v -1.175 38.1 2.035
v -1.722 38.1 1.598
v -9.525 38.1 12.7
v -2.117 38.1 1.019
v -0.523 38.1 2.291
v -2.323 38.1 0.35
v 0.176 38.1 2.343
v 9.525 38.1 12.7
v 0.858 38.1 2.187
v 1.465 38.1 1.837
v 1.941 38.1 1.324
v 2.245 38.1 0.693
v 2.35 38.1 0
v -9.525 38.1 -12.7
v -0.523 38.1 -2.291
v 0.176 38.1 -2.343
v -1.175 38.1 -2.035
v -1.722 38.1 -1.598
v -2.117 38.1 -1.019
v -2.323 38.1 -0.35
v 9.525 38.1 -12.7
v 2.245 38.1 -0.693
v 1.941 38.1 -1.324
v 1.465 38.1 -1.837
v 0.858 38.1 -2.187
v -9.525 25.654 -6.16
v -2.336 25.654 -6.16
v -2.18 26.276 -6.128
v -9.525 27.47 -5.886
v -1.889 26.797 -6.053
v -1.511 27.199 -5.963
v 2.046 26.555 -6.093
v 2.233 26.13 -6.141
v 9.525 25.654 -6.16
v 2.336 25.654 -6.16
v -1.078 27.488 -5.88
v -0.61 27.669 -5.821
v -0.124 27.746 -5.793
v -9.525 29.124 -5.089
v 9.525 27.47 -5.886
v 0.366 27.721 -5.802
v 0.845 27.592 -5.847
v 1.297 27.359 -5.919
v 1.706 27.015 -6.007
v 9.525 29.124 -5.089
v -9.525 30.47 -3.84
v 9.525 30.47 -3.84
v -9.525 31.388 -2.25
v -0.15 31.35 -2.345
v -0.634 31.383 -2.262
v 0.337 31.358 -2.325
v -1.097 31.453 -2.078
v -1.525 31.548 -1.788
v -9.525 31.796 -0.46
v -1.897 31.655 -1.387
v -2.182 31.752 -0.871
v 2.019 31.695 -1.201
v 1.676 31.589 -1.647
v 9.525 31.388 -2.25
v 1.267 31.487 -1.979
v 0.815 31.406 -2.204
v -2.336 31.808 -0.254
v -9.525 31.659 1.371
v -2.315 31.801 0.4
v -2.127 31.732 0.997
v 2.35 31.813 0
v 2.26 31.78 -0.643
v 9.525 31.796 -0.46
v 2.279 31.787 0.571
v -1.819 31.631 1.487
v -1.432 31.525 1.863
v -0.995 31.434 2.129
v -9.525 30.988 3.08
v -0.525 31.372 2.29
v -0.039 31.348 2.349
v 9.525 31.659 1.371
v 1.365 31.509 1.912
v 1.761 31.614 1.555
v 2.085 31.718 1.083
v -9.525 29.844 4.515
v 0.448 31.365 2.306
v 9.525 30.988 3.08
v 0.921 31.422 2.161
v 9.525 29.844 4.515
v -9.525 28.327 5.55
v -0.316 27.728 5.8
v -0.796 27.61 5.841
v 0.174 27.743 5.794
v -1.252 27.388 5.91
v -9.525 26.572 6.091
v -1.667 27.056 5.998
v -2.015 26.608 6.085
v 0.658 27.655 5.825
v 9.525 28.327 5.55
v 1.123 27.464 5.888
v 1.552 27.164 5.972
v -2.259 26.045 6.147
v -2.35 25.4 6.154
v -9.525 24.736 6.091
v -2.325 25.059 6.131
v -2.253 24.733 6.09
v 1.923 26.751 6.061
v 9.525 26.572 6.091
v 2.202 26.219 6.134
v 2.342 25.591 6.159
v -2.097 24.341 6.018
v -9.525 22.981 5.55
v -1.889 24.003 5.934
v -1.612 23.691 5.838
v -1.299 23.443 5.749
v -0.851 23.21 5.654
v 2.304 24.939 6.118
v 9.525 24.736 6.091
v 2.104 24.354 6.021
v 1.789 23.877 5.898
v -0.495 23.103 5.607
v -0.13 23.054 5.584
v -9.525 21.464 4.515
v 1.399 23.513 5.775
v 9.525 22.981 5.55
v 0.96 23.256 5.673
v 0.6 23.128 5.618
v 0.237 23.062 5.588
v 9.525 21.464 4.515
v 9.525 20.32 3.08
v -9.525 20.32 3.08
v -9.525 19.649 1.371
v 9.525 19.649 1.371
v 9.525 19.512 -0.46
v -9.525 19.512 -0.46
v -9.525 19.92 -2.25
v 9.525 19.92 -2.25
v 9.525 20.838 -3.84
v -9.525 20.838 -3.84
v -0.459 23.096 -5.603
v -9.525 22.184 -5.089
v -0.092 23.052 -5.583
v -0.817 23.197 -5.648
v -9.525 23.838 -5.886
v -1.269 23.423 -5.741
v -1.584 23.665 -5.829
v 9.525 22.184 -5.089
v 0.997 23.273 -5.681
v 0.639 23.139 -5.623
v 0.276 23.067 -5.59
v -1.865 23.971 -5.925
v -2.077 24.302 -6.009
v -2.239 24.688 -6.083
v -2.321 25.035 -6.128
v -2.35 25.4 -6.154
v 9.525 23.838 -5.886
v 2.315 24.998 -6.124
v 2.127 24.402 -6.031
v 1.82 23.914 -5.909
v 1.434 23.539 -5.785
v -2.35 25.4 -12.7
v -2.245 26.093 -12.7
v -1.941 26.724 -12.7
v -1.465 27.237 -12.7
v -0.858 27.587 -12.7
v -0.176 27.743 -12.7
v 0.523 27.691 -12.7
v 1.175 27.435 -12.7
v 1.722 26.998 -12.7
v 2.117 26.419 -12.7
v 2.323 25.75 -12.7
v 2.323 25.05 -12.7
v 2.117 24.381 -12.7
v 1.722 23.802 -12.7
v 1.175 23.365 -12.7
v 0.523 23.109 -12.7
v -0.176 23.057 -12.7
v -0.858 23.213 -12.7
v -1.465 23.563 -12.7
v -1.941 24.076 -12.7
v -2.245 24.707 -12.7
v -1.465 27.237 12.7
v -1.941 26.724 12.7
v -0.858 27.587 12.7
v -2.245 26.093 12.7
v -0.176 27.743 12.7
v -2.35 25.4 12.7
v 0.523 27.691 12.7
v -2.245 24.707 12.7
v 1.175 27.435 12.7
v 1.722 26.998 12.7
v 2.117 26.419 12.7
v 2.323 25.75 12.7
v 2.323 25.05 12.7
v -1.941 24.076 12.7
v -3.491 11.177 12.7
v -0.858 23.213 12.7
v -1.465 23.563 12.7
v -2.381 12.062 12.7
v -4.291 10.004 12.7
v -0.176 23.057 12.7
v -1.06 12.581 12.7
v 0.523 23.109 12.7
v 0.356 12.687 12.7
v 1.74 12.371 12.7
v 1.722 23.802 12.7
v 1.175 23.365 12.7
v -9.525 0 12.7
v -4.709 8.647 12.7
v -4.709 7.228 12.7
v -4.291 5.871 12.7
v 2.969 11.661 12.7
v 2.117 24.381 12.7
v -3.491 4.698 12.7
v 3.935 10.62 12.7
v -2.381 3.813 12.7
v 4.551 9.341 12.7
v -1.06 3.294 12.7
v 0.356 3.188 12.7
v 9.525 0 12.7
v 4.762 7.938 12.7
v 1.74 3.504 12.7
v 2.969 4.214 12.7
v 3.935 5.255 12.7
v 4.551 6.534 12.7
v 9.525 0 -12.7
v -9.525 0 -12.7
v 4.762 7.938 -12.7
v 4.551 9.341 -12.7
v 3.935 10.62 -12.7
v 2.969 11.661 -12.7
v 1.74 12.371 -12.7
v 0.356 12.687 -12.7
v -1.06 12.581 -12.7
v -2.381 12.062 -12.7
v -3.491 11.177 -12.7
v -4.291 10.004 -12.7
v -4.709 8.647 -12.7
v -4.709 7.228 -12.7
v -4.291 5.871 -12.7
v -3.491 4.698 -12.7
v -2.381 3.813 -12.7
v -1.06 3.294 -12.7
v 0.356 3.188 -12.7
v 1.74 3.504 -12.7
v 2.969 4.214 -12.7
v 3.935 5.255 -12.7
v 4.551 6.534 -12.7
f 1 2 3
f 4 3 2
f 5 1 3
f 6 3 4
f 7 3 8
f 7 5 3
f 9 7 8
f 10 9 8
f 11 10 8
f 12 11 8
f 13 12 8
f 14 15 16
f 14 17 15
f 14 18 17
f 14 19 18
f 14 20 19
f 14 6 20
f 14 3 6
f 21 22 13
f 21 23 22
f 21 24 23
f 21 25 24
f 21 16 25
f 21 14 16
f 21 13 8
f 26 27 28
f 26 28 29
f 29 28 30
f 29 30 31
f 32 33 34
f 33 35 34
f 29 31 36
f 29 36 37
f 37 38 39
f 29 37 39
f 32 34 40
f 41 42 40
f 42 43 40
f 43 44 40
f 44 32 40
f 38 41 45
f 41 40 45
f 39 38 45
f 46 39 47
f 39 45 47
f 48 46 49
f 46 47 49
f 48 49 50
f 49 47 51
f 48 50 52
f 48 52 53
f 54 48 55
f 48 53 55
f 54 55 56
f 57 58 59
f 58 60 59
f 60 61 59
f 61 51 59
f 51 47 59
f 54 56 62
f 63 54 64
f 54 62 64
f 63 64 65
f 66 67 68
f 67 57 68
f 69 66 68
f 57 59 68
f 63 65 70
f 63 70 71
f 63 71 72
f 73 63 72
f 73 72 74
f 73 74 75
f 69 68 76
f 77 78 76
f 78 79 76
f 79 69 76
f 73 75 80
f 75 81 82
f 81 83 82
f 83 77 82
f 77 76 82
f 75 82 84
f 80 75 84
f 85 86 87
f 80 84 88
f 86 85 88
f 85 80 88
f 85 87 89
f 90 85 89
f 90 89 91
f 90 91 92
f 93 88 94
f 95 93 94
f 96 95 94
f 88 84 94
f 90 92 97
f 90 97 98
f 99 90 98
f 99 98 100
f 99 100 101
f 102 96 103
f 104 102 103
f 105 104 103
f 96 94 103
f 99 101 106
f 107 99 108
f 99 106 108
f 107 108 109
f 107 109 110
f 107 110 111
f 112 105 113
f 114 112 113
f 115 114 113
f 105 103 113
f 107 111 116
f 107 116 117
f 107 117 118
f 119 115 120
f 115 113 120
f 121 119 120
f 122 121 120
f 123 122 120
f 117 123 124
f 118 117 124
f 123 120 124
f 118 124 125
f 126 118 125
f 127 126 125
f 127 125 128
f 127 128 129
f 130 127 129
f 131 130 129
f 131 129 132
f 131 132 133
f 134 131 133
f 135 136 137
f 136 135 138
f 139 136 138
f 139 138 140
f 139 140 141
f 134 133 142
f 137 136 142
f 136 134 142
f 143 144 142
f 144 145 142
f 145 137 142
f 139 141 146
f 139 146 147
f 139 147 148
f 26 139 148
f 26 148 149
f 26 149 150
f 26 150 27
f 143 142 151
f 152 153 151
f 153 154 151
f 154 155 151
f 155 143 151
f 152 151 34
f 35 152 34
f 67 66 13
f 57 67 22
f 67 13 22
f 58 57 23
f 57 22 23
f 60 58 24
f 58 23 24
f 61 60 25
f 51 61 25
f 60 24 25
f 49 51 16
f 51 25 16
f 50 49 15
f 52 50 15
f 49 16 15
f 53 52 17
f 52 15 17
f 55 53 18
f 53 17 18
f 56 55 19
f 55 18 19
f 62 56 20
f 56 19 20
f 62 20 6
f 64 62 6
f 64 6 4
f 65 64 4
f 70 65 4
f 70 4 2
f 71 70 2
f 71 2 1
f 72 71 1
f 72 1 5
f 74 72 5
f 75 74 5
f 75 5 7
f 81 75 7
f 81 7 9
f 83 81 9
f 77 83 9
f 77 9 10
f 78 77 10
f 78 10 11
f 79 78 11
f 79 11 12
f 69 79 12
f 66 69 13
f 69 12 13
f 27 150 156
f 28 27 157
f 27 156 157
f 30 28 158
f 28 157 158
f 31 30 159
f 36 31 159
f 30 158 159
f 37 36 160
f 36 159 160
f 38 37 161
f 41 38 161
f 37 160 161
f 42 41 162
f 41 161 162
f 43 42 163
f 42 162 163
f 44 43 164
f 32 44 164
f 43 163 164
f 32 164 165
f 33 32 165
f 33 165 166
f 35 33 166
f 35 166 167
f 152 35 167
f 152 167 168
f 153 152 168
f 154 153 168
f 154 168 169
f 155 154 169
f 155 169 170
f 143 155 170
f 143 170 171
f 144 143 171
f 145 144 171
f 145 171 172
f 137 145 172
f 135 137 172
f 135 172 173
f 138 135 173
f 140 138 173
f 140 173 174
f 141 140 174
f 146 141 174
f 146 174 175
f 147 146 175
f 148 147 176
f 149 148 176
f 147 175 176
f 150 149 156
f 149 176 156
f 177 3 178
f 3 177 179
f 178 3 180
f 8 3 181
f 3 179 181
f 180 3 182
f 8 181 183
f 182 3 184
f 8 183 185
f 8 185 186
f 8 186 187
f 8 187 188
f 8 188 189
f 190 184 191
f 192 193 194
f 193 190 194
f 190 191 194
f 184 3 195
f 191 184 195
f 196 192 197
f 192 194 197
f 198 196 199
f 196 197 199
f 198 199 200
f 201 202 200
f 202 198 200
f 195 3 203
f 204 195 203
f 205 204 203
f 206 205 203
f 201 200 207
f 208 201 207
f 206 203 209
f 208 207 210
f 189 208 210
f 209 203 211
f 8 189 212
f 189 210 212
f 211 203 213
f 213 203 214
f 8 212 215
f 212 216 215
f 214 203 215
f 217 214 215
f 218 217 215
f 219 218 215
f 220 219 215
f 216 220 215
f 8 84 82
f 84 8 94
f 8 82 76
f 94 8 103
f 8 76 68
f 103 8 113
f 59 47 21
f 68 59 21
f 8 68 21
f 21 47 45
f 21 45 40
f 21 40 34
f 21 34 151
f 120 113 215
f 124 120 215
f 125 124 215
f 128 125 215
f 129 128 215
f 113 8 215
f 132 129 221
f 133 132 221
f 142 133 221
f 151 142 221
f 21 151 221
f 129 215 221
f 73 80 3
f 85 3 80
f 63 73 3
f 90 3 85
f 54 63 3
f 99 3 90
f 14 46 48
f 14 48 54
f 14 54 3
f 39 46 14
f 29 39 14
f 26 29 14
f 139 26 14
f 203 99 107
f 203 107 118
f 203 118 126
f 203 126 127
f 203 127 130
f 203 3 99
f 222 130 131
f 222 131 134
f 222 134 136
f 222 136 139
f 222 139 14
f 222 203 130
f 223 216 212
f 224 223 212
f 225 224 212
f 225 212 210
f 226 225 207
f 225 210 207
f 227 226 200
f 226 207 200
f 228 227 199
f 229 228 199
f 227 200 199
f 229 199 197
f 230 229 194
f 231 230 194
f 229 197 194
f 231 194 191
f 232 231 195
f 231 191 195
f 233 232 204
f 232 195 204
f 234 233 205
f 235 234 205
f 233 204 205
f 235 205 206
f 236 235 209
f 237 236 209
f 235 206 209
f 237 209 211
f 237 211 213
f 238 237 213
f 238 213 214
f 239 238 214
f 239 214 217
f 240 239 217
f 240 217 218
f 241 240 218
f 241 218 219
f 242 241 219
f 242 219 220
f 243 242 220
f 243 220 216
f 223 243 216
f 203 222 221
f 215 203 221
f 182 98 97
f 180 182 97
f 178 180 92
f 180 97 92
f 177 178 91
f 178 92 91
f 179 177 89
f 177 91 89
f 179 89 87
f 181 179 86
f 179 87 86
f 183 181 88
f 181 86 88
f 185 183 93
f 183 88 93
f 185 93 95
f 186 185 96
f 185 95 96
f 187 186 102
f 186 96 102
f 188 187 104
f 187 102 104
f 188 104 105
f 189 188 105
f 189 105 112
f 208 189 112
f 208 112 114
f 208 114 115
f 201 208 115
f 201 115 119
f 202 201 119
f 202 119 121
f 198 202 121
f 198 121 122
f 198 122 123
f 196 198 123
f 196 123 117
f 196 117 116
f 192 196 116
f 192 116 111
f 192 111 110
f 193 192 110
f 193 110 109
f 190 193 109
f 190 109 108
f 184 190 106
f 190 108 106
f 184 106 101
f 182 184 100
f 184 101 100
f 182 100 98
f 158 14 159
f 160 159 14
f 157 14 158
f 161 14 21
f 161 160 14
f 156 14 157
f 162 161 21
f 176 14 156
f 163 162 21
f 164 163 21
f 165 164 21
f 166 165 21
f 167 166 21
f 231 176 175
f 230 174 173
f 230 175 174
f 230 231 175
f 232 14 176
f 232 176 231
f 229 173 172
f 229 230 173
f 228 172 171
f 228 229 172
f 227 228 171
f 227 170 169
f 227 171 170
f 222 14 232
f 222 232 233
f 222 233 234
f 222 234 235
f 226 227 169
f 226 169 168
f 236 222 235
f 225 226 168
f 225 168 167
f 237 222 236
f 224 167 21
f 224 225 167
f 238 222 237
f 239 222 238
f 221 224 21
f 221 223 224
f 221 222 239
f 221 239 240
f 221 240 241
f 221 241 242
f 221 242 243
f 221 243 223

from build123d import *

# Parameters (mm, degrees)
SKETCH1_W           = 19.05
SKETCH1_H           = 25.4
BOSS_EXTRUDE1_DEPTH = 38.1
SKETCH2_R           = 4.7625
CUT_EXTRUDE1_DEPTH  = 26.4
SKETCH3_R           = 6.1595
CUT_EXTRUDE2_DEPTH  = 20.05
CUT_EXTRUDE3_REACH  = 40.1
SKETCH4_R           = 2.3495
SKETCH5_R           = 2.3495
CUT_EXTRUDE4_DEPTH  = 26.4


with BuildPart() as part:
    # Sketch1 → Boss-Extrude1 (new body)
    with BuildSketch(Plane(origin=(0, 0, 0), x_dir=(1, 0, 0), z_dir=(0, 1, 0))):
        Rectangle(SKETCH1_W, SKETCH1_H)
    extrude(amount=BOSS_EXTRUDE1_DEPTH)

    # Sketch2 → Cut-Extrude1 (cut, through all)
    with BuildSketch(Plane.XY.offset(12.7)):
        with Locations((0, 7.9375)):
            Circle(SKETCH2_R)
    extrude(amount=-CUT_EXTRUDE1_DEPTH, mode=Mode.SUBTRACT)

    # Sketch3 → Cut-Extrude2 (cut, through all)
    with BuildSketch(Plane(origin=(9.525, 0, 0), x_dir=(0, 0, -1), z_dir=(1, 0, 0))):
        with Locations((0, 25.654)):
            Circle(SKETCH3_R)
    extrude(amount=-CUT_EXTRUDE2_DEPTH, mode=Mode.SUBTRACT)

    # Sketch4 → Cut-Extrude3 (cut, up to next)
    with BuildSketch(Plane(origin=(0, 38.1, 0), x_dir=(1, 0, 0), z_dir=(0, 1, 0)), mode=Mode.PRIVATE) as cut_extrude3_sk1:
        Circle(SKETCH4_R)
    cut_extrude3_tool1 = extrude(cut_extrude3_sk1.sketch, amount=-CUT_EXTRUDE3_REACH, mode=Mode.PRIVATE) & part.part
    add(cut_extrude3_tool1.solids().sort_by_distance((0, 38.1, 0))[0], mode=Mode.SUBTRACT)

    # Sketch5 → Cut-Extrude4 (cut, through all)
    with BuildSketch(Plane(origin=(0, 0, -12.7), x_dir=(-1, 0, 0), z_dir=(0, 0, -1))):
        with Locations((0, 25.4)):
            Circle(SKETCH5_R)
    extrude(amount=-CUT_EXTRUDE4_DEPTH, mode=Mode.SUBTRACT)


solid = part.part
